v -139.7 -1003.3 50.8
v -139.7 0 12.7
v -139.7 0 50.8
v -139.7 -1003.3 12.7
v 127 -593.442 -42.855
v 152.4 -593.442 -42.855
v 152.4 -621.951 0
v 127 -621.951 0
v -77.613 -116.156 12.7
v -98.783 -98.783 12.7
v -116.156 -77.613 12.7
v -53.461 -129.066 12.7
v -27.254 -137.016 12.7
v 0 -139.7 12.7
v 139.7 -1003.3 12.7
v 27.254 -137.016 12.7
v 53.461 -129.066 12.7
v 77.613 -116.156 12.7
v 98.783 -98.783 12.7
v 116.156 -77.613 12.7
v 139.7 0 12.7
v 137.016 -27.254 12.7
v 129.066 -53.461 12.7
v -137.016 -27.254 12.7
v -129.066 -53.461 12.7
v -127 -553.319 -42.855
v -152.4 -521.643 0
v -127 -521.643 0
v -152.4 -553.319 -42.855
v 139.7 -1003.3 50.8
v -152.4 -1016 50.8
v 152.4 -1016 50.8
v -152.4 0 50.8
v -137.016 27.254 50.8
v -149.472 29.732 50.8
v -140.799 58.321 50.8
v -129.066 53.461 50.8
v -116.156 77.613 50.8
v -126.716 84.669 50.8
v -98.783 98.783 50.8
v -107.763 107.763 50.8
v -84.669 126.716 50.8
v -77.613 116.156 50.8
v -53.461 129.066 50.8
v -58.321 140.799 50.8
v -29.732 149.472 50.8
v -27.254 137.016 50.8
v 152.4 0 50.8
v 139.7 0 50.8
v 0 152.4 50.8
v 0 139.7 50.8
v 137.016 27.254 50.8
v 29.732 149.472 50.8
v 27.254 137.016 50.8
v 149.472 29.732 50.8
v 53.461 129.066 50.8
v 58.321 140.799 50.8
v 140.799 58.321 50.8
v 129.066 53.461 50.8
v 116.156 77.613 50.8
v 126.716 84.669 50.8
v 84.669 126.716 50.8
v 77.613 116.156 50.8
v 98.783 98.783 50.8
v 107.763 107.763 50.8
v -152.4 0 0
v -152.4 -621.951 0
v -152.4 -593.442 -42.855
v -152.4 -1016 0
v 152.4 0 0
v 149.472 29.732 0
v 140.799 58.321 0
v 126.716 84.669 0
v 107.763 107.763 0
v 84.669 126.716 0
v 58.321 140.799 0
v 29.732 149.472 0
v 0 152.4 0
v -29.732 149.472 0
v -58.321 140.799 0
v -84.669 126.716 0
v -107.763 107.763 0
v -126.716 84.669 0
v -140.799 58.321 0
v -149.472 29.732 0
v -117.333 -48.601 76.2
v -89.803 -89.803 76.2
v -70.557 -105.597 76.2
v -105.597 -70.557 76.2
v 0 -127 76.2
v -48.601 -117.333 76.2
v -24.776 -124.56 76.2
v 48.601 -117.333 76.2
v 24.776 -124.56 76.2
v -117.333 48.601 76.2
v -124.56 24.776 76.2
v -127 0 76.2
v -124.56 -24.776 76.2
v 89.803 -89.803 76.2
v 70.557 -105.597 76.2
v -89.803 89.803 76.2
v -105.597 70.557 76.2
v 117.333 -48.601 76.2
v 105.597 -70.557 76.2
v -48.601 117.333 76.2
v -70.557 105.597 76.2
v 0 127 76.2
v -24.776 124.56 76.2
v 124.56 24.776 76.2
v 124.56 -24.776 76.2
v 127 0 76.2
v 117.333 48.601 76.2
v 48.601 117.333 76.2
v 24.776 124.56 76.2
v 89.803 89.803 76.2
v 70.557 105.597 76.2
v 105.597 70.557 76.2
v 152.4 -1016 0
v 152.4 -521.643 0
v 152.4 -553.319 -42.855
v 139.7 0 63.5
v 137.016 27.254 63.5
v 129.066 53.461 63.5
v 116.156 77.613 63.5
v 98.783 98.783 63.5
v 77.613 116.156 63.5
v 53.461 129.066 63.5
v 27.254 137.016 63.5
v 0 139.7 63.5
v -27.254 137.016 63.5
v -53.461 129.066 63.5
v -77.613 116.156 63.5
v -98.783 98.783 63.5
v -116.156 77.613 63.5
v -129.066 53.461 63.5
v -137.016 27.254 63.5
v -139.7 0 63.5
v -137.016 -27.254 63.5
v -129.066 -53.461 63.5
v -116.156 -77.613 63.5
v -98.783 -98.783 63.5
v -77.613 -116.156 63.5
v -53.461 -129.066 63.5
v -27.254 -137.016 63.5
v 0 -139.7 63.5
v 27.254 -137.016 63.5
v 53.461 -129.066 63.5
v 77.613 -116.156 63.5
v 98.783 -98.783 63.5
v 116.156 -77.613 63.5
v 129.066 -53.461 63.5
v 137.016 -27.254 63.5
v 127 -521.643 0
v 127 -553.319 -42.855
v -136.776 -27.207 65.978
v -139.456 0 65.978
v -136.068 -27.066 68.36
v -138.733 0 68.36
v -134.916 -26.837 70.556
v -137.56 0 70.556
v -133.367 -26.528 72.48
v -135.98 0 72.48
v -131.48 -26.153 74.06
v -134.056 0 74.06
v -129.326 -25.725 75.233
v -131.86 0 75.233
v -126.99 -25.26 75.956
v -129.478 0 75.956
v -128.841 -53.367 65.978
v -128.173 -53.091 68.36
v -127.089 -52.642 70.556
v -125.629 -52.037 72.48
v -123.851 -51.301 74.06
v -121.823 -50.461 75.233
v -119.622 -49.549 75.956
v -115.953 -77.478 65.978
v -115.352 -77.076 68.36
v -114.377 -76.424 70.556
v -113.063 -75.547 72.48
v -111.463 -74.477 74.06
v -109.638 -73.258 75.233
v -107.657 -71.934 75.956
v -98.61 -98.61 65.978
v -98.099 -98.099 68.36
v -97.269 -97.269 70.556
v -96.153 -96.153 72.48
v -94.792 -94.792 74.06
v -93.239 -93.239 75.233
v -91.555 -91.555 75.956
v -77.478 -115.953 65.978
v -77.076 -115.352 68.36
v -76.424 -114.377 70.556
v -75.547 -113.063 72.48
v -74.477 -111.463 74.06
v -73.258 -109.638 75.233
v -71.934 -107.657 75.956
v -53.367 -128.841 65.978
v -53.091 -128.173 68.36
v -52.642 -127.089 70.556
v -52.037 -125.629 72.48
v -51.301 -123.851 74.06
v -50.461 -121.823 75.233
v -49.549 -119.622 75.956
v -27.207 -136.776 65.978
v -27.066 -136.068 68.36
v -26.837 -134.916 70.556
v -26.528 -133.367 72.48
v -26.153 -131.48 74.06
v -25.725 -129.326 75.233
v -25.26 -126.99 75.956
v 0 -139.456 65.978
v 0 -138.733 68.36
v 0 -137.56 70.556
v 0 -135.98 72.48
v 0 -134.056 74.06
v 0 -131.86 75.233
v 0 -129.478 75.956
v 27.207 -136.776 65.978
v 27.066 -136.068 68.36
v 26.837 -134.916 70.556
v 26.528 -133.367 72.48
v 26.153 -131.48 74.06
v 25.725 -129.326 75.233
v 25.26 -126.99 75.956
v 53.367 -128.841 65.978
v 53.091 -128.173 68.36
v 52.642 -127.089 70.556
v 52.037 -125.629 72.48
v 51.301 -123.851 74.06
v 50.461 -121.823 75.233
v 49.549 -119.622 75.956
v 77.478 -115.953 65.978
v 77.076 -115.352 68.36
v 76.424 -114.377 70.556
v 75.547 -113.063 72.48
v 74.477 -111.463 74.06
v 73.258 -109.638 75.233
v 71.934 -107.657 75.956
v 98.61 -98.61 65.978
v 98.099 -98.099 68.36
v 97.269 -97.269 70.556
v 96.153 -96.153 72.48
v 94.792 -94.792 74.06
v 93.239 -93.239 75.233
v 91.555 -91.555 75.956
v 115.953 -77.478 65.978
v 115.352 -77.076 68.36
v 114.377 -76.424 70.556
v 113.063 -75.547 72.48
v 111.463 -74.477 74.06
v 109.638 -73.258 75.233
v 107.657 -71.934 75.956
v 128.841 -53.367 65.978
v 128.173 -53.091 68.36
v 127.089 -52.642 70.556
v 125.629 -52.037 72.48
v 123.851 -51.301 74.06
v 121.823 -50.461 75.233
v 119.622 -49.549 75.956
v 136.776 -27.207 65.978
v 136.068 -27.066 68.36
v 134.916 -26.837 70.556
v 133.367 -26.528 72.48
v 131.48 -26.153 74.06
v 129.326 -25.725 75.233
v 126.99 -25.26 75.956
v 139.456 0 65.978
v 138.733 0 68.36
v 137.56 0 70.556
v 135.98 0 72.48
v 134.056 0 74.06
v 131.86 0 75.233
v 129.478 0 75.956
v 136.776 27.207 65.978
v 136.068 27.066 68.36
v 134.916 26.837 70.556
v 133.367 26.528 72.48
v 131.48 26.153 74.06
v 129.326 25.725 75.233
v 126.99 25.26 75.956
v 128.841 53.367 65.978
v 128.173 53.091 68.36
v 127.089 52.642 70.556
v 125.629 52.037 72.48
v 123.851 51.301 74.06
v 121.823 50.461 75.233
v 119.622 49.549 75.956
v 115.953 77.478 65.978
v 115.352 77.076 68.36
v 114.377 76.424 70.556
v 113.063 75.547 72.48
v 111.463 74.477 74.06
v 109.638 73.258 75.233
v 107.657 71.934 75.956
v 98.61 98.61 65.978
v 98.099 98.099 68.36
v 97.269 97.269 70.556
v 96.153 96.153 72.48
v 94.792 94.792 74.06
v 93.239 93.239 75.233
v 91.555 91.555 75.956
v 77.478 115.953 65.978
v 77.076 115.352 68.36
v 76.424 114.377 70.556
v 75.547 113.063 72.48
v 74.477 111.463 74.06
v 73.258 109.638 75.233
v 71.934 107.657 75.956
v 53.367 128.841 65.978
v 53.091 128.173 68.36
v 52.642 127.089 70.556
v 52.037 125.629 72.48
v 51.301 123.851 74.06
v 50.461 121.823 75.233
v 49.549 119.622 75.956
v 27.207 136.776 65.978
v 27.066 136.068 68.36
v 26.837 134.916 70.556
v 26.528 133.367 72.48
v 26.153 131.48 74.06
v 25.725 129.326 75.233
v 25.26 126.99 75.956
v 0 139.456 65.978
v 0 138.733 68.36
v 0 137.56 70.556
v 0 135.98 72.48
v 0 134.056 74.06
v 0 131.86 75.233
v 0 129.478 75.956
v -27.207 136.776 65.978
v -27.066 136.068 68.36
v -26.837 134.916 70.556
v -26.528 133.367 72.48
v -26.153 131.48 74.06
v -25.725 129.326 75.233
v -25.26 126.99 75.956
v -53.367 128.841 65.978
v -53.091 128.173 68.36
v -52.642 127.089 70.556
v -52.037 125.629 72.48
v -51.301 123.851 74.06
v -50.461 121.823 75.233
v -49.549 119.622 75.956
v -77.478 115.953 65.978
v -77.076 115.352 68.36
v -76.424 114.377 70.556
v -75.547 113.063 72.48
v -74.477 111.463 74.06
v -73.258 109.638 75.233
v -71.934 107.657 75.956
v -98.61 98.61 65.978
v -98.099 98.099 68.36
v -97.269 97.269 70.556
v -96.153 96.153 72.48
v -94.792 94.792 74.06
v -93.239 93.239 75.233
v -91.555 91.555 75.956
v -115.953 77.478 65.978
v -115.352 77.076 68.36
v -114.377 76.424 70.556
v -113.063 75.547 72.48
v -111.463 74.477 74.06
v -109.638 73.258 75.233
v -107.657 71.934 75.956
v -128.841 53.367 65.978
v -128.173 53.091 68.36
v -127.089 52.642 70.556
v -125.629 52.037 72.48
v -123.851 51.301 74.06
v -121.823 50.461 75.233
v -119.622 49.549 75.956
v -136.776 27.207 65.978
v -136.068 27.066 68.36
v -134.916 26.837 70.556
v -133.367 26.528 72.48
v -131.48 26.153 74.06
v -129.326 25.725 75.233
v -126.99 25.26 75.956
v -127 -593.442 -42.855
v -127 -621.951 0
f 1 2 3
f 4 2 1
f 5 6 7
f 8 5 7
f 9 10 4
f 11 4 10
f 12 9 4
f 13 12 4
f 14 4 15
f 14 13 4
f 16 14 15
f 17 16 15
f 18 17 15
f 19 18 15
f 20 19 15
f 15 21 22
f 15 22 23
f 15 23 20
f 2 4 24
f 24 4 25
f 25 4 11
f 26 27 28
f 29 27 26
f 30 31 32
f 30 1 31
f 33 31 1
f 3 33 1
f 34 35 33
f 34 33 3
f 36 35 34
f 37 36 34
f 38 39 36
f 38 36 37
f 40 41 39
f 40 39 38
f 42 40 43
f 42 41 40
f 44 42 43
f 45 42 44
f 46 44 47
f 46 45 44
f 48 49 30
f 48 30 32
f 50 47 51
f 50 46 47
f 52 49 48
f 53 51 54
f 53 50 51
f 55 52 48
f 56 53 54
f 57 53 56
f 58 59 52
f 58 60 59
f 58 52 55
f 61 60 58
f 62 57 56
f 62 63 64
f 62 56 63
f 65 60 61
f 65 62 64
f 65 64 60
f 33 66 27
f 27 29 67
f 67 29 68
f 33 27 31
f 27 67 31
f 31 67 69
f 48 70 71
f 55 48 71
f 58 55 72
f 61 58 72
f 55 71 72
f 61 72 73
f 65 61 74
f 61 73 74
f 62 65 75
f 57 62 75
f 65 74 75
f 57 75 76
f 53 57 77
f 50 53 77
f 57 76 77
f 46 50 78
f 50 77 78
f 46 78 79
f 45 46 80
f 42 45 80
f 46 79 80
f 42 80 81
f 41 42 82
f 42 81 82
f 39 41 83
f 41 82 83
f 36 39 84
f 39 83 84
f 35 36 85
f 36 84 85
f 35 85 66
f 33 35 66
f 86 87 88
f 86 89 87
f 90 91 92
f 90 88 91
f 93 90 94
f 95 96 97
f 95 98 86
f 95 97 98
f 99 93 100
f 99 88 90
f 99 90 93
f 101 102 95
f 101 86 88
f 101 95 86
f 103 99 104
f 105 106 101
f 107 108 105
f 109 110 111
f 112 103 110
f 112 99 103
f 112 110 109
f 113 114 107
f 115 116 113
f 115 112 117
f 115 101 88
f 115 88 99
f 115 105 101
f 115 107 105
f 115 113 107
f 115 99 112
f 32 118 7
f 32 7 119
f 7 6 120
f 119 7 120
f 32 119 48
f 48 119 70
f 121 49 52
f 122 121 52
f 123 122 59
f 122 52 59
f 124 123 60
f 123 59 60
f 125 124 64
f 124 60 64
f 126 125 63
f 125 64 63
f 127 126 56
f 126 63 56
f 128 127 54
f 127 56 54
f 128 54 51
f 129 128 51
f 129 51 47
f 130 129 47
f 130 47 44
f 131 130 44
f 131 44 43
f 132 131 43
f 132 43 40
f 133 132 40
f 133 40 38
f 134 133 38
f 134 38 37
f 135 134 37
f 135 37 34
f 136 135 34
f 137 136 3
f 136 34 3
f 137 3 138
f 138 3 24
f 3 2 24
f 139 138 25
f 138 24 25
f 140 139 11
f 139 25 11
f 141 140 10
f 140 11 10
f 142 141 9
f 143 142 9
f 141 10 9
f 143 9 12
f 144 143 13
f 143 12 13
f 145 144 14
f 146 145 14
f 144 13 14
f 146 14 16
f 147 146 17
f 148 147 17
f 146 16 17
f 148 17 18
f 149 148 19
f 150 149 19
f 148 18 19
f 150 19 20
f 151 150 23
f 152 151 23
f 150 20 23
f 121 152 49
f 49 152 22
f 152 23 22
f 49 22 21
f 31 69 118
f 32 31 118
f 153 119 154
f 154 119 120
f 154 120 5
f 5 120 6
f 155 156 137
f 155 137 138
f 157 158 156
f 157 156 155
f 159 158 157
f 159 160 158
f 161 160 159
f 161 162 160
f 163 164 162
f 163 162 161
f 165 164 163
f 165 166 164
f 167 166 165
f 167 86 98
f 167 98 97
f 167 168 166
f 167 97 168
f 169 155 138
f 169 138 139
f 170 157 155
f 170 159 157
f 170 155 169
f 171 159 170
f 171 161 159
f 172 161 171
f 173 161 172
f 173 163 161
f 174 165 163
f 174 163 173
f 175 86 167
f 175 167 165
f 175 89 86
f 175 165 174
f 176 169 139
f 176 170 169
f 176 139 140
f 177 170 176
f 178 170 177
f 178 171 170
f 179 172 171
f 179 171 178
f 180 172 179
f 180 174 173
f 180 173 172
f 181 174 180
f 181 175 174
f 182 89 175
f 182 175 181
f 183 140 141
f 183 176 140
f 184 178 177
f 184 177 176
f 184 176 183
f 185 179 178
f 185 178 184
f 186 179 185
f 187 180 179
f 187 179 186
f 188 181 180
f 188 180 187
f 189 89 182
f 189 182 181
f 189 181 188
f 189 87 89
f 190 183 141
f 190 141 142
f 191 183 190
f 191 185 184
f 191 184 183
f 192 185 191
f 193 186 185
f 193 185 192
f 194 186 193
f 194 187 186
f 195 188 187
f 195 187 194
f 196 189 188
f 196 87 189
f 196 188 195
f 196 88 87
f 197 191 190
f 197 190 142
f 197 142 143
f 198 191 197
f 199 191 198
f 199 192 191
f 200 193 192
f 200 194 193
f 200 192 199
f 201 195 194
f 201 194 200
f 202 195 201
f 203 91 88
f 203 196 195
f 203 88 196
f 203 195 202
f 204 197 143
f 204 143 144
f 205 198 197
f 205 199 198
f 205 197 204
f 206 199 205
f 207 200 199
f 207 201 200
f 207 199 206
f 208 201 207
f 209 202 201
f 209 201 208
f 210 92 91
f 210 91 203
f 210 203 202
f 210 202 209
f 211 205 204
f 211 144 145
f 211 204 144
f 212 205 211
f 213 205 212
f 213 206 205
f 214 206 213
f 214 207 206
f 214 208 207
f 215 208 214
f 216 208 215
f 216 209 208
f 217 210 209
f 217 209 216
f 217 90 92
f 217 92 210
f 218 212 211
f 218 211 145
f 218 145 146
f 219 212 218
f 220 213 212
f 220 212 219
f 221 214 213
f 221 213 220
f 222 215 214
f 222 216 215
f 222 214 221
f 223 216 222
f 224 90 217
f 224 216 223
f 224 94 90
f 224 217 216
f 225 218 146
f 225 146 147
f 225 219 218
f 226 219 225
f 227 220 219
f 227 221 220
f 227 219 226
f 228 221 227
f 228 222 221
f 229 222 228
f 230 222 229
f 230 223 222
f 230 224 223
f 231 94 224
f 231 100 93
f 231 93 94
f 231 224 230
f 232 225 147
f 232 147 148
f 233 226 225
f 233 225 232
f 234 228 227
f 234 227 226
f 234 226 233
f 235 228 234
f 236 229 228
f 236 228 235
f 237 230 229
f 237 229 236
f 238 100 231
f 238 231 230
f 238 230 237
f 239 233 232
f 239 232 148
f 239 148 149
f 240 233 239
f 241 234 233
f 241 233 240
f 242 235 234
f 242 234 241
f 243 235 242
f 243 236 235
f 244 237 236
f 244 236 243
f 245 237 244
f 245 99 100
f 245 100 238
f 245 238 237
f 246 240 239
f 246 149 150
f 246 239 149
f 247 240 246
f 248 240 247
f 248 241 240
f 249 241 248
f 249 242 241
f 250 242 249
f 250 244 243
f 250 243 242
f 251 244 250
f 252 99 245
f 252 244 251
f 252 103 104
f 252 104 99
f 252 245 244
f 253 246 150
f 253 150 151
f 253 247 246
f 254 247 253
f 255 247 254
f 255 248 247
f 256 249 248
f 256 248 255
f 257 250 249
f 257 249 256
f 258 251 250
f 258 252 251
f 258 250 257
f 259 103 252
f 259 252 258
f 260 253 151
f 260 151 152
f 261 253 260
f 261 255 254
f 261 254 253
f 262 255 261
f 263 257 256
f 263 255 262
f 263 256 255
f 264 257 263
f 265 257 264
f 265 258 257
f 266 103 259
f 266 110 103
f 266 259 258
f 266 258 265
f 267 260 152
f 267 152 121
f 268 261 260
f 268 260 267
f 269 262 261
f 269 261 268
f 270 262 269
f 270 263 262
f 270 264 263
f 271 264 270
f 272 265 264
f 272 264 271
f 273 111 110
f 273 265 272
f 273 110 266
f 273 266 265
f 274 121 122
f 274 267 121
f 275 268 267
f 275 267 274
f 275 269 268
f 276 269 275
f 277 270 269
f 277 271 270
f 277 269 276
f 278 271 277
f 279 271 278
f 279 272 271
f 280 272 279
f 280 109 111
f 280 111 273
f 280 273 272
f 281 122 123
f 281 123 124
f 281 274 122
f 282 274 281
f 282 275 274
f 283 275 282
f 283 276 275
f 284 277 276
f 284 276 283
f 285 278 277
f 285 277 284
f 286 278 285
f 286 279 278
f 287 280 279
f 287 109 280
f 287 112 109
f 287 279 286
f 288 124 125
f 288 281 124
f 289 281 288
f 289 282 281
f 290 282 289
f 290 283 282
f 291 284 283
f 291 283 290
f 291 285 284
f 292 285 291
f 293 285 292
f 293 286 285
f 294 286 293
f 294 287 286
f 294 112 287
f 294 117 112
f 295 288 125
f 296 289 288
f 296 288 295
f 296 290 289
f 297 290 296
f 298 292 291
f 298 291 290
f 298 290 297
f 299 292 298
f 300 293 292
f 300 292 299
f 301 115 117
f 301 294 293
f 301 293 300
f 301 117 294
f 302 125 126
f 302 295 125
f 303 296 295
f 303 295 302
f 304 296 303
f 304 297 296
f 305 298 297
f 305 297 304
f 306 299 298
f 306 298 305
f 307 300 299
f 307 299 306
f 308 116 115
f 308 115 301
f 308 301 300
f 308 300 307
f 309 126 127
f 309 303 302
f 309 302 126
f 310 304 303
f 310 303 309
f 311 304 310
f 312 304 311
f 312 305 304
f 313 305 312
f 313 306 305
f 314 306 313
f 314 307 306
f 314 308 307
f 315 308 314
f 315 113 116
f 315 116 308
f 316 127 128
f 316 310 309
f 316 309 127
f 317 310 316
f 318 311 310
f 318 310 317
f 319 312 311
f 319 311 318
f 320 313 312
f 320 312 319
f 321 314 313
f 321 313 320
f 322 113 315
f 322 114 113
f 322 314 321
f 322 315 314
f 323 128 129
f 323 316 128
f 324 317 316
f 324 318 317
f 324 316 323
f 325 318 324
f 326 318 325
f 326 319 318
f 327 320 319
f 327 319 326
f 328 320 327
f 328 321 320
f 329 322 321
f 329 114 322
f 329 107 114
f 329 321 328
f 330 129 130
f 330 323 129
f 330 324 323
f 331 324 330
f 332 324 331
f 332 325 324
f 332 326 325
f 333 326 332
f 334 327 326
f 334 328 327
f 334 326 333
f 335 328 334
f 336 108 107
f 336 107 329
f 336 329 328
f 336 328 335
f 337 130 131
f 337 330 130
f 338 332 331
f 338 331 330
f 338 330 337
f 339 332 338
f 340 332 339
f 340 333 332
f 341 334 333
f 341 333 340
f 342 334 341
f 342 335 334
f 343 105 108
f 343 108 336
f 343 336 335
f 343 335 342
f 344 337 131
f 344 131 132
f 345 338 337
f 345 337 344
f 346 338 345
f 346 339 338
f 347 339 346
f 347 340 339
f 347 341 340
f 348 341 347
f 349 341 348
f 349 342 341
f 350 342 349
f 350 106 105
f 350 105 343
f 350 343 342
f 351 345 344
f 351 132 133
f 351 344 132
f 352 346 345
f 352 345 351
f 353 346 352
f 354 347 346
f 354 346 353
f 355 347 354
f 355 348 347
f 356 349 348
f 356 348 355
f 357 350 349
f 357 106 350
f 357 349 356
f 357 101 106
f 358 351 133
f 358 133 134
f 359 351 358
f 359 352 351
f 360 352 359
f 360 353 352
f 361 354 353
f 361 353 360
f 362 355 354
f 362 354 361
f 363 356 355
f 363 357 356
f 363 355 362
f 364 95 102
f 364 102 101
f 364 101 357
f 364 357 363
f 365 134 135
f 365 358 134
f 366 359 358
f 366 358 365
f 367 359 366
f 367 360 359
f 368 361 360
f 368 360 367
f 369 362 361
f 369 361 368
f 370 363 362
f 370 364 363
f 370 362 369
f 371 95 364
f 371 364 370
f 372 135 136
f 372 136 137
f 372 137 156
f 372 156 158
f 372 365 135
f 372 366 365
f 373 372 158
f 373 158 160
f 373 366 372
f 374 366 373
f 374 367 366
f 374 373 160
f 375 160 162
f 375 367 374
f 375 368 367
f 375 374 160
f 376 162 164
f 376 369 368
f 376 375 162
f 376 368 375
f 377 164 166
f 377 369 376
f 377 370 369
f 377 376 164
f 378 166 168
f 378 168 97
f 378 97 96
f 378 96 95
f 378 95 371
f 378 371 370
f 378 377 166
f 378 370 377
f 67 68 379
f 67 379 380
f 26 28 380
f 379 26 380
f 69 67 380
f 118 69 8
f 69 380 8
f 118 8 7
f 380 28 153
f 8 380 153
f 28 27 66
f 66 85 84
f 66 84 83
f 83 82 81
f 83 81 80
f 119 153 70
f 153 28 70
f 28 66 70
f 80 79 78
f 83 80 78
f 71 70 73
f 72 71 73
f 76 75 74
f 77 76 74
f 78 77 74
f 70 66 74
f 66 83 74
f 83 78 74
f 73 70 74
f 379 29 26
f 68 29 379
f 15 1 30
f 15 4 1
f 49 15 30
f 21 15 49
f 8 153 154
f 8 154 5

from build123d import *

# Parameters (mm, degrees)
F1_DEPTH = 50.8
F2_T     = -12.7
F3_R     = 139.7
F4_DEPTH = 63.5
F7_DEPTH = 25.4


# Not quite as in the source:
# - a fillet or chamfer that OpenCascade refuses, or shapes differently, is made with other operations: its cross-section is extruded or revolved along the edge and cut away or added


with BuildPart() as f1:
    # F0 (on Top) → F1 (new body)
    with BuildSketch(Plane.XY):
        with BuildLine():
            Line((152.4, -1016), (152.4, 0))
            ThreePointArc((152.4, 0), (0, -152.4), (-152.4, 0))
            Line((-152.4, 0), (-152.4, -1016))
            Line((-152.4, -1016), (152.4, -1016))
        make_face()
        with BuildLine():
            ThreePointArc((-152.4, 0), (0, -152.4), (152.4, 0))
            Line((152.4, 0), (-152.4, 0))
        make_face()
        with BuildLine():
            Line((-152.4, 0), (152.4, 0))
            ThreePointArc((152.4, 0), (0, 152.4), (-152.4, 0))
        make_face()
    extrude(amount=F1_DEPTH)

    # F2
    f2_openings = [f1.faces().sort_by_distance(p)[0] for p in [
        (0, -447.64327, 50.8),
    ]]
    offset(amount=F2_T, openings=f2_openings)

    # F3 (on face) → F4 (join)
    with BuildSketch(Plane.XY.offset(12.7)):
        Circle(F3_R)
        with BuildLine():
            ThreePointArc((-139.7, 0), (0, -139.7), (139.7, 0))
            ThreePointArc((139.7, 0), (0, 139.7), (-139.7, 0))
        make_face()
    extrude(amount=F4_DEPTH)

    # F5: fillet of radius 12.7 on 1 edges, made by hand

    # F5_s1 → F5_t2 (revolve, cut)
    with BuildSketch(Plane.XZ):
        with BuildLine():
            ThreePointArc((-139.7, 63.5), (-135.9802561211, 72.4802561211), (-127, 76.2))
            Line((-127, 76.2), (-139.7, 76.2))
            Line((-139.7, 76.2), (-139.7, 63.5))
        make_face()
    revolve(axis=Axis((0, 0, 76.2), (0, 0, 1)), mode=Mode.SUBTRACT)

    # F6 (on face) → F7 (join)
    with BuildSketch(Plane(origin=(-152.4, 0, 0), x_dir=(0, -1, 0), z_dir=(-1, 0, 0))):
        Polygon((621.9508647919, 0), (521.6426849365, 0), (553.3189177513, -42.8551286459), (593.4422016144, -42.8551286459), align=None)
    extrude(amount=-F7_DEPTH)

    # F8: F1 across plane


with BuildPart() as f1_1:
    add(f1.part)
    add(f1.part.mirror(Plane.YZ))


solid = f1_1.part
